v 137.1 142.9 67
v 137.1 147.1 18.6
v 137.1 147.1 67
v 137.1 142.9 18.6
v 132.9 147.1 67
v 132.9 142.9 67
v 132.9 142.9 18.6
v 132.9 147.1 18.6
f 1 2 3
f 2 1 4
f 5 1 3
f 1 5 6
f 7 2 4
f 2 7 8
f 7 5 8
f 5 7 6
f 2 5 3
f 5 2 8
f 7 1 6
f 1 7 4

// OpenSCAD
// Generated by spec/prepare_parent_retrofit_printing.py from validated release fasteners. NOT A PRINTABLE PART.
union(){
translate([132.9, 142.9, 18.599999237060548]) cube([4.2, 4.2, 48.400003814697264]);
translate([132.9, 142.9, 18.599999237060548]) cube([4.2, 4.2, 48.400003814697264]);
}
